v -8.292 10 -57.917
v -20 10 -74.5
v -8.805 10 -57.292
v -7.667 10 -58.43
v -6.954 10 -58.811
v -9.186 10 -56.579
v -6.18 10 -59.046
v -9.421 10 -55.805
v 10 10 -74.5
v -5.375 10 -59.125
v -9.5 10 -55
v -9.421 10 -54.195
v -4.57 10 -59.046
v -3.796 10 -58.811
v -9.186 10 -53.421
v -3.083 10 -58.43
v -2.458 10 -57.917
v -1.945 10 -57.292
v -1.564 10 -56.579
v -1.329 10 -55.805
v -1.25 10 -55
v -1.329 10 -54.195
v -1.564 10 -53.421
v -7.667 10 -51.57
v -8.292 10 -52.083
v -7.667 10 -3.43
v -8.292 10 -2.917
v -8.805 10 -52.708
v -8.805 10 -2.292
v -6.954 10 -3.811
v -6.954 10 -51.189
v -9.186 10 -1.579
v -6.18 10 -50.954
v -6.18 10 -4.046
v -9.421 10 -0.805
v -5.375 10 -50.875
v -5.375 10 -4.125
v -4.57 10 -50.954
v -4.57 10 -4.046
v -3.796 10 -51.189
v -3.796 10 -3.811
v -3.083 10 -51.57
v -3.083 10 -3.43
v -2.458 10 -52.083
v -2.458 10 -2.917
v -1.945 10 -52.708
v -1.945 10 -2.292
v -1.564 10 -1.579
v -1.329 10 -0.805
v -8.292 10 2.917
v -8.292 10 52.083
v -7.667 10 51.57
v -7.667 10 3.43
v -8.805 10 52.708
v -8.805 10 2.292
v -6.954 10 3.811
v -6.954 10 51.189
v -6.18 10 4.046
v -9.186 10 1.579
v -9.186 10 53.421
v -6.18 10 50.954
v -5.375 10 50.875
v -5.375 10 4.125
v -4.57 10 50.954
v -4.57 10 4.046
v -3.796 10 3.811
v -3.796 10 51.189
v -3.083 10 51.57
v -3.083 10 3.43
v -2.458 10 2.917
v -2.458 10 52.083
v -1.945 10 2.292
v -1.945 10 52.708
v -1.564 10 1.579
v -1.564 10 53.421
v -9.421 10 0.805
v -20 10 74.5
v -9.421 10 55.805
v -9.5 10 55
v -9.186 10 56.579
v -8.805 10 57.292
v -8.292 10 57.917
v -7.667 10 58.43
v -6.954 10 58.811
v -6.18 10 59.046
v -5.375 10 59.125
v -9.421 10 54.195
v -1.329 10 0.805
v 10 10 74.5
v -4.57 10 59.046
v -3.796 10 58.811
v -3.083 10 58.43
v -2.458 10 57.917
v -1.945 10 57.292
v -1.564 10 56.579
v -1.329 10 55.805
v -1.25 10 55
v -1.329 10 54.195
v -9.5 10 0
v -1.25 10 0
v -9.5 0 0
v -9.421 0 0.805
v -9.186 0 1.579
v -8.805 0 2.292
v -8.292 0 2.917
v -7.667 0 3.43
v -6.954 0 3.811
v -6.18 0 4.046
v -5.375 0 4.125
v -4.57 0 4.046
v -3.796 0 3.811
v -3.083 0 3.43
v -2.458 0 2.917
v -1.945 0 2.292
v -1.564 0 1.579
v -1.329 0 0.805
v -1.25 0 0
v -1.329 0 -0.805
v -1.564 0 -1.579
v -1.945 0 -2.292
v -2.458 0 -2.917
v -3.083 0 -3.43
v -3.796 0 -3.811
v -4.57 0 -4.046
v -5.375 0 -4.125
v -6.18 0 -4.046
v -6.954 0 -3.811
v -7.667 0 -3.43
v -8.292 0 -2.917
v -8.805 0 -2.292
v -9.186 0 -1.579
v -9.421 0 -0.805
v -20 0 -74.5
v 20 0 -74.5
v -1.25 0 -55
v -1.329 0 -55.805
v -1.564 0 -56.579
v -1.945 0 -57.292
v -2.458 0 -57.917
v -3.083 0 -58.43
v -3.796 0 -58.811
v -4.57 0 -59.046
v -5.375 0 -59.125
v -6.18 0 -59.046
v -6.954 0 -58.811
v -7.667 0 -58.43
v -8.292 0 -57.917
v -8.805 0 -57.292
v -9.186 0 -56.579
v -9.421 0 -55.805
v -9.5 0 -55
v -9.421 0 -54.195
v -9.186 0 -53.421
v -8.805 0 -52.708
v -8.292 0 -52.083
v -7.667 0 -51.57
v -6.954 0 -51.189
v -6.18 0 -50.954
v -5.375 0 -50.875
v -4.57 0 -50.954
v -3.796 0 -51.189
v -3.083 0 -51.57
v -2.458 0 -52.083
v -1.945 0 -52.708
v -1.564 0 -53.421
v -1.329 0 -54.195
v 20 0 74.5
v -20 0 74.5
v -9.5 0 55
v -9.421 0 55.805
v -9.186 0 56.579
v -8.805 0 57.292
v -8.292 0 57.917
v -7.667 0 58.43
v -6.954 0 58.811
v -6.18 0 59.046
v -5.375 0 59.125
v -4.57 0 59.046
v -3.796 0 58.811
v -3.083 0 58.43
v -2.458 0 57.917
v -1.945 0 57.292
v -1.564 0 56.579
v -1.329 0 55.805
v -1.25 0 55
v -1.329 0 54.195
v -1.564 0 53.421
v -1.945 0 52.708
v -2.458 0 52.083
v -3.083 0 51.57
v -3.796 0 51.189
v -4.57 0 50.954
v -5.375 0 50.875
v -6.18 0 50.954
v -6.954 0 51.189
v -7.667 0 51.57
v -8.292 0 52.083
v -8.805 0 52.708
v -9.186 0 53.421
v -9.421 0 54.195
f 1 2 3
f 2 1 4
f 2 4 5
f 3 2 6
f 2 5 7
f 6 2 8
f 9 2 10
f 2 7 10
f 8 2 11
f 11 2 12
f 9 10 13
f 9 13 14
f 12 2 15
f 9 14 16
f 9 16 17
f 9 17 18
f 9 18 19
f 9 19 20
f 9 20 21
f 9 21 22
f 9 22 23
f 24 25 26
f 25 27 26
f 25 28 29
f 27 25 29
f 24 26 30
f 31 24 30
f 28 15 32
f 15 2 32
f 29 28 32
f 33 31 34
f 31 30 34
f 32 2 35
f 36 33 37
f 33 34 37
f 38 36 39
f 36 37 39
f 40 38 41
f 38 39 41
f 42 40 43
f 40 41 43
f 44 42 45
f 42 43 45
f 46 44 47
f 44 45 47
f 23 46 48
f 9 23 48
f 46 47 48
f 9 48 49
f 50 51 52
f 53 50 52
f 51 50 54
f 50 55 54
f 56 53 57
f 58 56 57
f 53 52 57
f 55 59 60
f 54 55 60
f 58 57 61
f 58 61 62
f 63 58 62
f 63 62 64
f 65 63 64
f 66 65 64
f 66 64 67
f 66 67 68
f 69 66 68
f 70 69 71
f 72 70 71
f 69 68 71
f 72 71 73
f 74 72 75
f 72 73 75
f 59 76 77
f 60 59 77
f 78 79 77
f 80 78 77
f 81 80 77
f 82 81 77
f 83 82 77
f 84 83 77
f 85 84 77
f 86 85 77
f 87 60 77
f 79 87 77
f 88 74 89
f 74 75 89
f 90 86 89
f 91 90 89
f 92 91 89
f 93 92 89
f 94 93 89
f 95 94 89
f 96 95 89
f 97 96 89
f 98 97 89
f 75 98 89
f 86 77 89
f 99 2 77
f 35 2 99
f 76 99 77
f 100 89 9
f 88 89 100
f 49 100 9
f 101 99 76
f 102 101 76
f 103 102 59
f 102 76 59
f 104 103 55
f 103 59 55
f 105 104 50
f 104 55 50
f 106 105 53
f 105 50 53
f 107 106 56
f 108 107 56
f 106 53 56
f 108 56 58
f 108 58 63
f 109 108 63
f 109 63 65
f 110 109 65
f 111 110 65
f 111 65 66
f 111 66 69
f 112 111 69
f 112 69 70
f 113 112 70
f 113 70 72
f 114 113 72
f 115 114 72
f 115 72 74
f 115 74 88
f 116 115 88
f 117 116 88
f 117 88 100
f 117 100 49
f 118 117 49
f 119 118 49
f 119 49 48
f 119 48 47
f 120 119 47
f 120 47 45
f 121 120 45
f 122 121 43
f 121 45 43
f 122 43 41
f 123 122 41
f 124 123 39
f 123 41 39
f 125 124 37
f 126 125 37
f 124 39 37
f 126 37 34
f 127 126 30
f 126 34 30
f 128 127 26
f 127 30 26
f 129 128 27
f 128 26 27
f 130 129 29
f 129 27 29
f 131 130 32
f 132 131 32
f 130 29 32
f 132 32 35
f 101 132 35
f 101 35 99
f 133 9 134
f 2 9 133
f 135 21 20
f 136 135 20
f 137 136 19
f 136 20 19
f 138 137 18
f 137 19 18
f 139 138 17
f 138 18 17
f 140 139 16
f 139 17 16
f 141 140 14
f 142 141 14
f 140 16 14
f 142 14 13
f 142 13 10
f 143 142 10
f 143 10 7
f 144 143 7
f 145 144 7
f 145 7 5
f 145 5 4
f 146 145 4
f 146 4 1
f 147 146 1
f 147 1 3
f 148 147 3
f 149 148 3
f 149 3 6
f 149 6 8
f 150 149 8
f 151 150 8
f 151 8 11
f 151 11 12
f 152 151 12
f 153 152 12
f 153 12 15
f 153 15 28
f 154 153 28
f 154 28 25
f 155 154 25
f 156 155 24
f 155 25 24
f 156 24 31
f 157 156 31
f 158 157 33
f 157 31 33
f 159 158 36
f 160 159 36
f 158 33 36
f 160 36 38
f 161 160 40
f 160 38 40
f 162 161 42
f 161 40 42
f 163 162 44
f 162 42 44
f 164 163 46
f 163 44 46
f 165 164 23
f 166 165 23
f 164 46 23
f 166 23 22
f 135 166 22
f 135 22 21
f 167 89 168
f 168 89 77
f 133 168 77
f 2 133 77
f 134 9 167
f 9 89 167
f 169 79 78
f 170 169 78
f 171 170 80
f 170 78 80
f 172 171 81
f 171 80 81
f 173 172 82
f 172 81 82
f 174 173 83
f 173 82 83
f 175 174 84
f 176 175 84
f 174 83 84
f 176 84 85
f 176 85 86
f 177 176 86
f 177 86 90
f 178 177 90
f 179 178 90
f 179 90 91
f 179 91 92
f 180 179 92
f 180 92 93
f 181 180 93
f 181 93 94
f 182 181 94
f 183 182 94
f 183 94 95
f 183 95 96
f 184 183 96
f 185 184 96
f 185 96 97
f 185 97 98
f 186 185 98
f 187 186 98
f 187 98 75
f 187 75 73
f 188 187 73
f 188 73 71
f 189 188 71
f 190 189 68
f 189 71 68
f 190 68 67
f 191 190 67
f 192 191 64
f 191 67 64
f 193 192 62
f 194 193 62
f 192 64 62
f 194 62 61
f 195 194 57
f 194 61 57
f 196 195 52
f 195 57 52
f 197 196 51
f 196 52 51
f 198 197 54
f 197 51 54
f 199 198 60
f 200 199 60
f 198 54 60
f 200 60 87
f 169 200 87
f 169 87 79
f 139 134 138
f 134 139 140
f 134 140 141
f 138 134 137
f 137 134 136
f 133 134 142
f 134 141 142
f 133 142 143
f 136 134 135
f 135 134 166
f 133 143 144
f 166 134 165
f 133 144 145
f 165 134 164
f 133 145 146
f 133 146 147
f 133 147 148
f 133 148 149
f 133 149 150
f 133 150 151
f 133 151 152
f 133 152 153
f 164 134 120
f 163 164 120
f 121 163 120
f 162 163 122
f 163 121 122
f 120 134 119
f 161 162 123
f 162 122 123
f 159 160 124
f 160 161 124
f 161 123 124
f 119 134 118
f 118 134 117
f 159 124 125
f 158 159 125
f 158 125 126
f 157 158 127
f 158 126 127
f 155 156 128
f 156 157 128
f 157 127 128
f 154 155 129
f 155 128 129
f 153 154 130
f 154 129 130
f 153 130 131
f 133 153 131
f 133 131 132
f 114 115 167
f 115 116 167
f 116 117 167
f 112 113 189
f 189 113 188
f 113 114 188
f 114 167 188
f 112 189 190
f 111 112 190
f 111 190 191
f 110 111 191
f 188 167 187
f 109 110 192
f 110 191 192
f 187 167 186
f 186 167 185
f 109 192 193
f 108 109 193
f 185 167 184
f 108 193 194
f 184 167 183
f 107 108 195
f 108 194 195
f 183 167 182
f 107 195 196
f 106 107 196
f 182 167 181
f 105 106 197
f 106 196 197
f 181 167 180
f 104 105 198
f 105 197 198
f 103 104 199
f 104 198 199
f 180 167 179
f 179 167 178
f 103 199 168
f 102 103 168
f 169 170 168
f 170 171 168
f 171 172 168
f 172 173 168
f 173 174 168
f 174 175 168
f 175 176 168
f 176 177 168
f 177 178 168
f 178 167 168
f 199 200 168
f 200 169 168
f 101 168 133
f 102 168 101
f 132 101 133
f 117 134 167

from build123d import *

# Parameters (mm, degrees)
BOSS_EXTRUDE1_DEPTH = 74.5
SKETCH2_R           = 4.125
CUT_EXTRUDE1_DEPTH  = 78.783352975


with BuildPart() as part:
    # Sketch1 → Boss-Extrude1 (new, symmetric)
    with BuildSketch(Plane.XY):
        Polygon((-20, 10), (10, 10), (20, 0), (-20, 0), align=None)
    extrude(amount=BOSS_EXTRUDE1_DEPTH, both=True)

    # Sketch2 → Cut-Extrude1 (cut, through all)
    with BuildSketch(Plane(origin=(0, 10, 0), x_dir=(1, 0, 0), z_dir=(0, 1, 0))):
        with Locations(Location((-5.375, 0, 0), (0, 0, 180))):
            Circle(SKETCH2_R)
        with Locations(Location((-5.375, -55, 0), (0, 0, 180))):
            Circle(SKETCH2_R)
        with Locations((-5.375, 55)):
            Circle(SKETCH2_R)
    extrude(amount=-CUT_EXTRUDE1_DEPTH, mode=Mode.SUBTRACT)


solid = part.part
